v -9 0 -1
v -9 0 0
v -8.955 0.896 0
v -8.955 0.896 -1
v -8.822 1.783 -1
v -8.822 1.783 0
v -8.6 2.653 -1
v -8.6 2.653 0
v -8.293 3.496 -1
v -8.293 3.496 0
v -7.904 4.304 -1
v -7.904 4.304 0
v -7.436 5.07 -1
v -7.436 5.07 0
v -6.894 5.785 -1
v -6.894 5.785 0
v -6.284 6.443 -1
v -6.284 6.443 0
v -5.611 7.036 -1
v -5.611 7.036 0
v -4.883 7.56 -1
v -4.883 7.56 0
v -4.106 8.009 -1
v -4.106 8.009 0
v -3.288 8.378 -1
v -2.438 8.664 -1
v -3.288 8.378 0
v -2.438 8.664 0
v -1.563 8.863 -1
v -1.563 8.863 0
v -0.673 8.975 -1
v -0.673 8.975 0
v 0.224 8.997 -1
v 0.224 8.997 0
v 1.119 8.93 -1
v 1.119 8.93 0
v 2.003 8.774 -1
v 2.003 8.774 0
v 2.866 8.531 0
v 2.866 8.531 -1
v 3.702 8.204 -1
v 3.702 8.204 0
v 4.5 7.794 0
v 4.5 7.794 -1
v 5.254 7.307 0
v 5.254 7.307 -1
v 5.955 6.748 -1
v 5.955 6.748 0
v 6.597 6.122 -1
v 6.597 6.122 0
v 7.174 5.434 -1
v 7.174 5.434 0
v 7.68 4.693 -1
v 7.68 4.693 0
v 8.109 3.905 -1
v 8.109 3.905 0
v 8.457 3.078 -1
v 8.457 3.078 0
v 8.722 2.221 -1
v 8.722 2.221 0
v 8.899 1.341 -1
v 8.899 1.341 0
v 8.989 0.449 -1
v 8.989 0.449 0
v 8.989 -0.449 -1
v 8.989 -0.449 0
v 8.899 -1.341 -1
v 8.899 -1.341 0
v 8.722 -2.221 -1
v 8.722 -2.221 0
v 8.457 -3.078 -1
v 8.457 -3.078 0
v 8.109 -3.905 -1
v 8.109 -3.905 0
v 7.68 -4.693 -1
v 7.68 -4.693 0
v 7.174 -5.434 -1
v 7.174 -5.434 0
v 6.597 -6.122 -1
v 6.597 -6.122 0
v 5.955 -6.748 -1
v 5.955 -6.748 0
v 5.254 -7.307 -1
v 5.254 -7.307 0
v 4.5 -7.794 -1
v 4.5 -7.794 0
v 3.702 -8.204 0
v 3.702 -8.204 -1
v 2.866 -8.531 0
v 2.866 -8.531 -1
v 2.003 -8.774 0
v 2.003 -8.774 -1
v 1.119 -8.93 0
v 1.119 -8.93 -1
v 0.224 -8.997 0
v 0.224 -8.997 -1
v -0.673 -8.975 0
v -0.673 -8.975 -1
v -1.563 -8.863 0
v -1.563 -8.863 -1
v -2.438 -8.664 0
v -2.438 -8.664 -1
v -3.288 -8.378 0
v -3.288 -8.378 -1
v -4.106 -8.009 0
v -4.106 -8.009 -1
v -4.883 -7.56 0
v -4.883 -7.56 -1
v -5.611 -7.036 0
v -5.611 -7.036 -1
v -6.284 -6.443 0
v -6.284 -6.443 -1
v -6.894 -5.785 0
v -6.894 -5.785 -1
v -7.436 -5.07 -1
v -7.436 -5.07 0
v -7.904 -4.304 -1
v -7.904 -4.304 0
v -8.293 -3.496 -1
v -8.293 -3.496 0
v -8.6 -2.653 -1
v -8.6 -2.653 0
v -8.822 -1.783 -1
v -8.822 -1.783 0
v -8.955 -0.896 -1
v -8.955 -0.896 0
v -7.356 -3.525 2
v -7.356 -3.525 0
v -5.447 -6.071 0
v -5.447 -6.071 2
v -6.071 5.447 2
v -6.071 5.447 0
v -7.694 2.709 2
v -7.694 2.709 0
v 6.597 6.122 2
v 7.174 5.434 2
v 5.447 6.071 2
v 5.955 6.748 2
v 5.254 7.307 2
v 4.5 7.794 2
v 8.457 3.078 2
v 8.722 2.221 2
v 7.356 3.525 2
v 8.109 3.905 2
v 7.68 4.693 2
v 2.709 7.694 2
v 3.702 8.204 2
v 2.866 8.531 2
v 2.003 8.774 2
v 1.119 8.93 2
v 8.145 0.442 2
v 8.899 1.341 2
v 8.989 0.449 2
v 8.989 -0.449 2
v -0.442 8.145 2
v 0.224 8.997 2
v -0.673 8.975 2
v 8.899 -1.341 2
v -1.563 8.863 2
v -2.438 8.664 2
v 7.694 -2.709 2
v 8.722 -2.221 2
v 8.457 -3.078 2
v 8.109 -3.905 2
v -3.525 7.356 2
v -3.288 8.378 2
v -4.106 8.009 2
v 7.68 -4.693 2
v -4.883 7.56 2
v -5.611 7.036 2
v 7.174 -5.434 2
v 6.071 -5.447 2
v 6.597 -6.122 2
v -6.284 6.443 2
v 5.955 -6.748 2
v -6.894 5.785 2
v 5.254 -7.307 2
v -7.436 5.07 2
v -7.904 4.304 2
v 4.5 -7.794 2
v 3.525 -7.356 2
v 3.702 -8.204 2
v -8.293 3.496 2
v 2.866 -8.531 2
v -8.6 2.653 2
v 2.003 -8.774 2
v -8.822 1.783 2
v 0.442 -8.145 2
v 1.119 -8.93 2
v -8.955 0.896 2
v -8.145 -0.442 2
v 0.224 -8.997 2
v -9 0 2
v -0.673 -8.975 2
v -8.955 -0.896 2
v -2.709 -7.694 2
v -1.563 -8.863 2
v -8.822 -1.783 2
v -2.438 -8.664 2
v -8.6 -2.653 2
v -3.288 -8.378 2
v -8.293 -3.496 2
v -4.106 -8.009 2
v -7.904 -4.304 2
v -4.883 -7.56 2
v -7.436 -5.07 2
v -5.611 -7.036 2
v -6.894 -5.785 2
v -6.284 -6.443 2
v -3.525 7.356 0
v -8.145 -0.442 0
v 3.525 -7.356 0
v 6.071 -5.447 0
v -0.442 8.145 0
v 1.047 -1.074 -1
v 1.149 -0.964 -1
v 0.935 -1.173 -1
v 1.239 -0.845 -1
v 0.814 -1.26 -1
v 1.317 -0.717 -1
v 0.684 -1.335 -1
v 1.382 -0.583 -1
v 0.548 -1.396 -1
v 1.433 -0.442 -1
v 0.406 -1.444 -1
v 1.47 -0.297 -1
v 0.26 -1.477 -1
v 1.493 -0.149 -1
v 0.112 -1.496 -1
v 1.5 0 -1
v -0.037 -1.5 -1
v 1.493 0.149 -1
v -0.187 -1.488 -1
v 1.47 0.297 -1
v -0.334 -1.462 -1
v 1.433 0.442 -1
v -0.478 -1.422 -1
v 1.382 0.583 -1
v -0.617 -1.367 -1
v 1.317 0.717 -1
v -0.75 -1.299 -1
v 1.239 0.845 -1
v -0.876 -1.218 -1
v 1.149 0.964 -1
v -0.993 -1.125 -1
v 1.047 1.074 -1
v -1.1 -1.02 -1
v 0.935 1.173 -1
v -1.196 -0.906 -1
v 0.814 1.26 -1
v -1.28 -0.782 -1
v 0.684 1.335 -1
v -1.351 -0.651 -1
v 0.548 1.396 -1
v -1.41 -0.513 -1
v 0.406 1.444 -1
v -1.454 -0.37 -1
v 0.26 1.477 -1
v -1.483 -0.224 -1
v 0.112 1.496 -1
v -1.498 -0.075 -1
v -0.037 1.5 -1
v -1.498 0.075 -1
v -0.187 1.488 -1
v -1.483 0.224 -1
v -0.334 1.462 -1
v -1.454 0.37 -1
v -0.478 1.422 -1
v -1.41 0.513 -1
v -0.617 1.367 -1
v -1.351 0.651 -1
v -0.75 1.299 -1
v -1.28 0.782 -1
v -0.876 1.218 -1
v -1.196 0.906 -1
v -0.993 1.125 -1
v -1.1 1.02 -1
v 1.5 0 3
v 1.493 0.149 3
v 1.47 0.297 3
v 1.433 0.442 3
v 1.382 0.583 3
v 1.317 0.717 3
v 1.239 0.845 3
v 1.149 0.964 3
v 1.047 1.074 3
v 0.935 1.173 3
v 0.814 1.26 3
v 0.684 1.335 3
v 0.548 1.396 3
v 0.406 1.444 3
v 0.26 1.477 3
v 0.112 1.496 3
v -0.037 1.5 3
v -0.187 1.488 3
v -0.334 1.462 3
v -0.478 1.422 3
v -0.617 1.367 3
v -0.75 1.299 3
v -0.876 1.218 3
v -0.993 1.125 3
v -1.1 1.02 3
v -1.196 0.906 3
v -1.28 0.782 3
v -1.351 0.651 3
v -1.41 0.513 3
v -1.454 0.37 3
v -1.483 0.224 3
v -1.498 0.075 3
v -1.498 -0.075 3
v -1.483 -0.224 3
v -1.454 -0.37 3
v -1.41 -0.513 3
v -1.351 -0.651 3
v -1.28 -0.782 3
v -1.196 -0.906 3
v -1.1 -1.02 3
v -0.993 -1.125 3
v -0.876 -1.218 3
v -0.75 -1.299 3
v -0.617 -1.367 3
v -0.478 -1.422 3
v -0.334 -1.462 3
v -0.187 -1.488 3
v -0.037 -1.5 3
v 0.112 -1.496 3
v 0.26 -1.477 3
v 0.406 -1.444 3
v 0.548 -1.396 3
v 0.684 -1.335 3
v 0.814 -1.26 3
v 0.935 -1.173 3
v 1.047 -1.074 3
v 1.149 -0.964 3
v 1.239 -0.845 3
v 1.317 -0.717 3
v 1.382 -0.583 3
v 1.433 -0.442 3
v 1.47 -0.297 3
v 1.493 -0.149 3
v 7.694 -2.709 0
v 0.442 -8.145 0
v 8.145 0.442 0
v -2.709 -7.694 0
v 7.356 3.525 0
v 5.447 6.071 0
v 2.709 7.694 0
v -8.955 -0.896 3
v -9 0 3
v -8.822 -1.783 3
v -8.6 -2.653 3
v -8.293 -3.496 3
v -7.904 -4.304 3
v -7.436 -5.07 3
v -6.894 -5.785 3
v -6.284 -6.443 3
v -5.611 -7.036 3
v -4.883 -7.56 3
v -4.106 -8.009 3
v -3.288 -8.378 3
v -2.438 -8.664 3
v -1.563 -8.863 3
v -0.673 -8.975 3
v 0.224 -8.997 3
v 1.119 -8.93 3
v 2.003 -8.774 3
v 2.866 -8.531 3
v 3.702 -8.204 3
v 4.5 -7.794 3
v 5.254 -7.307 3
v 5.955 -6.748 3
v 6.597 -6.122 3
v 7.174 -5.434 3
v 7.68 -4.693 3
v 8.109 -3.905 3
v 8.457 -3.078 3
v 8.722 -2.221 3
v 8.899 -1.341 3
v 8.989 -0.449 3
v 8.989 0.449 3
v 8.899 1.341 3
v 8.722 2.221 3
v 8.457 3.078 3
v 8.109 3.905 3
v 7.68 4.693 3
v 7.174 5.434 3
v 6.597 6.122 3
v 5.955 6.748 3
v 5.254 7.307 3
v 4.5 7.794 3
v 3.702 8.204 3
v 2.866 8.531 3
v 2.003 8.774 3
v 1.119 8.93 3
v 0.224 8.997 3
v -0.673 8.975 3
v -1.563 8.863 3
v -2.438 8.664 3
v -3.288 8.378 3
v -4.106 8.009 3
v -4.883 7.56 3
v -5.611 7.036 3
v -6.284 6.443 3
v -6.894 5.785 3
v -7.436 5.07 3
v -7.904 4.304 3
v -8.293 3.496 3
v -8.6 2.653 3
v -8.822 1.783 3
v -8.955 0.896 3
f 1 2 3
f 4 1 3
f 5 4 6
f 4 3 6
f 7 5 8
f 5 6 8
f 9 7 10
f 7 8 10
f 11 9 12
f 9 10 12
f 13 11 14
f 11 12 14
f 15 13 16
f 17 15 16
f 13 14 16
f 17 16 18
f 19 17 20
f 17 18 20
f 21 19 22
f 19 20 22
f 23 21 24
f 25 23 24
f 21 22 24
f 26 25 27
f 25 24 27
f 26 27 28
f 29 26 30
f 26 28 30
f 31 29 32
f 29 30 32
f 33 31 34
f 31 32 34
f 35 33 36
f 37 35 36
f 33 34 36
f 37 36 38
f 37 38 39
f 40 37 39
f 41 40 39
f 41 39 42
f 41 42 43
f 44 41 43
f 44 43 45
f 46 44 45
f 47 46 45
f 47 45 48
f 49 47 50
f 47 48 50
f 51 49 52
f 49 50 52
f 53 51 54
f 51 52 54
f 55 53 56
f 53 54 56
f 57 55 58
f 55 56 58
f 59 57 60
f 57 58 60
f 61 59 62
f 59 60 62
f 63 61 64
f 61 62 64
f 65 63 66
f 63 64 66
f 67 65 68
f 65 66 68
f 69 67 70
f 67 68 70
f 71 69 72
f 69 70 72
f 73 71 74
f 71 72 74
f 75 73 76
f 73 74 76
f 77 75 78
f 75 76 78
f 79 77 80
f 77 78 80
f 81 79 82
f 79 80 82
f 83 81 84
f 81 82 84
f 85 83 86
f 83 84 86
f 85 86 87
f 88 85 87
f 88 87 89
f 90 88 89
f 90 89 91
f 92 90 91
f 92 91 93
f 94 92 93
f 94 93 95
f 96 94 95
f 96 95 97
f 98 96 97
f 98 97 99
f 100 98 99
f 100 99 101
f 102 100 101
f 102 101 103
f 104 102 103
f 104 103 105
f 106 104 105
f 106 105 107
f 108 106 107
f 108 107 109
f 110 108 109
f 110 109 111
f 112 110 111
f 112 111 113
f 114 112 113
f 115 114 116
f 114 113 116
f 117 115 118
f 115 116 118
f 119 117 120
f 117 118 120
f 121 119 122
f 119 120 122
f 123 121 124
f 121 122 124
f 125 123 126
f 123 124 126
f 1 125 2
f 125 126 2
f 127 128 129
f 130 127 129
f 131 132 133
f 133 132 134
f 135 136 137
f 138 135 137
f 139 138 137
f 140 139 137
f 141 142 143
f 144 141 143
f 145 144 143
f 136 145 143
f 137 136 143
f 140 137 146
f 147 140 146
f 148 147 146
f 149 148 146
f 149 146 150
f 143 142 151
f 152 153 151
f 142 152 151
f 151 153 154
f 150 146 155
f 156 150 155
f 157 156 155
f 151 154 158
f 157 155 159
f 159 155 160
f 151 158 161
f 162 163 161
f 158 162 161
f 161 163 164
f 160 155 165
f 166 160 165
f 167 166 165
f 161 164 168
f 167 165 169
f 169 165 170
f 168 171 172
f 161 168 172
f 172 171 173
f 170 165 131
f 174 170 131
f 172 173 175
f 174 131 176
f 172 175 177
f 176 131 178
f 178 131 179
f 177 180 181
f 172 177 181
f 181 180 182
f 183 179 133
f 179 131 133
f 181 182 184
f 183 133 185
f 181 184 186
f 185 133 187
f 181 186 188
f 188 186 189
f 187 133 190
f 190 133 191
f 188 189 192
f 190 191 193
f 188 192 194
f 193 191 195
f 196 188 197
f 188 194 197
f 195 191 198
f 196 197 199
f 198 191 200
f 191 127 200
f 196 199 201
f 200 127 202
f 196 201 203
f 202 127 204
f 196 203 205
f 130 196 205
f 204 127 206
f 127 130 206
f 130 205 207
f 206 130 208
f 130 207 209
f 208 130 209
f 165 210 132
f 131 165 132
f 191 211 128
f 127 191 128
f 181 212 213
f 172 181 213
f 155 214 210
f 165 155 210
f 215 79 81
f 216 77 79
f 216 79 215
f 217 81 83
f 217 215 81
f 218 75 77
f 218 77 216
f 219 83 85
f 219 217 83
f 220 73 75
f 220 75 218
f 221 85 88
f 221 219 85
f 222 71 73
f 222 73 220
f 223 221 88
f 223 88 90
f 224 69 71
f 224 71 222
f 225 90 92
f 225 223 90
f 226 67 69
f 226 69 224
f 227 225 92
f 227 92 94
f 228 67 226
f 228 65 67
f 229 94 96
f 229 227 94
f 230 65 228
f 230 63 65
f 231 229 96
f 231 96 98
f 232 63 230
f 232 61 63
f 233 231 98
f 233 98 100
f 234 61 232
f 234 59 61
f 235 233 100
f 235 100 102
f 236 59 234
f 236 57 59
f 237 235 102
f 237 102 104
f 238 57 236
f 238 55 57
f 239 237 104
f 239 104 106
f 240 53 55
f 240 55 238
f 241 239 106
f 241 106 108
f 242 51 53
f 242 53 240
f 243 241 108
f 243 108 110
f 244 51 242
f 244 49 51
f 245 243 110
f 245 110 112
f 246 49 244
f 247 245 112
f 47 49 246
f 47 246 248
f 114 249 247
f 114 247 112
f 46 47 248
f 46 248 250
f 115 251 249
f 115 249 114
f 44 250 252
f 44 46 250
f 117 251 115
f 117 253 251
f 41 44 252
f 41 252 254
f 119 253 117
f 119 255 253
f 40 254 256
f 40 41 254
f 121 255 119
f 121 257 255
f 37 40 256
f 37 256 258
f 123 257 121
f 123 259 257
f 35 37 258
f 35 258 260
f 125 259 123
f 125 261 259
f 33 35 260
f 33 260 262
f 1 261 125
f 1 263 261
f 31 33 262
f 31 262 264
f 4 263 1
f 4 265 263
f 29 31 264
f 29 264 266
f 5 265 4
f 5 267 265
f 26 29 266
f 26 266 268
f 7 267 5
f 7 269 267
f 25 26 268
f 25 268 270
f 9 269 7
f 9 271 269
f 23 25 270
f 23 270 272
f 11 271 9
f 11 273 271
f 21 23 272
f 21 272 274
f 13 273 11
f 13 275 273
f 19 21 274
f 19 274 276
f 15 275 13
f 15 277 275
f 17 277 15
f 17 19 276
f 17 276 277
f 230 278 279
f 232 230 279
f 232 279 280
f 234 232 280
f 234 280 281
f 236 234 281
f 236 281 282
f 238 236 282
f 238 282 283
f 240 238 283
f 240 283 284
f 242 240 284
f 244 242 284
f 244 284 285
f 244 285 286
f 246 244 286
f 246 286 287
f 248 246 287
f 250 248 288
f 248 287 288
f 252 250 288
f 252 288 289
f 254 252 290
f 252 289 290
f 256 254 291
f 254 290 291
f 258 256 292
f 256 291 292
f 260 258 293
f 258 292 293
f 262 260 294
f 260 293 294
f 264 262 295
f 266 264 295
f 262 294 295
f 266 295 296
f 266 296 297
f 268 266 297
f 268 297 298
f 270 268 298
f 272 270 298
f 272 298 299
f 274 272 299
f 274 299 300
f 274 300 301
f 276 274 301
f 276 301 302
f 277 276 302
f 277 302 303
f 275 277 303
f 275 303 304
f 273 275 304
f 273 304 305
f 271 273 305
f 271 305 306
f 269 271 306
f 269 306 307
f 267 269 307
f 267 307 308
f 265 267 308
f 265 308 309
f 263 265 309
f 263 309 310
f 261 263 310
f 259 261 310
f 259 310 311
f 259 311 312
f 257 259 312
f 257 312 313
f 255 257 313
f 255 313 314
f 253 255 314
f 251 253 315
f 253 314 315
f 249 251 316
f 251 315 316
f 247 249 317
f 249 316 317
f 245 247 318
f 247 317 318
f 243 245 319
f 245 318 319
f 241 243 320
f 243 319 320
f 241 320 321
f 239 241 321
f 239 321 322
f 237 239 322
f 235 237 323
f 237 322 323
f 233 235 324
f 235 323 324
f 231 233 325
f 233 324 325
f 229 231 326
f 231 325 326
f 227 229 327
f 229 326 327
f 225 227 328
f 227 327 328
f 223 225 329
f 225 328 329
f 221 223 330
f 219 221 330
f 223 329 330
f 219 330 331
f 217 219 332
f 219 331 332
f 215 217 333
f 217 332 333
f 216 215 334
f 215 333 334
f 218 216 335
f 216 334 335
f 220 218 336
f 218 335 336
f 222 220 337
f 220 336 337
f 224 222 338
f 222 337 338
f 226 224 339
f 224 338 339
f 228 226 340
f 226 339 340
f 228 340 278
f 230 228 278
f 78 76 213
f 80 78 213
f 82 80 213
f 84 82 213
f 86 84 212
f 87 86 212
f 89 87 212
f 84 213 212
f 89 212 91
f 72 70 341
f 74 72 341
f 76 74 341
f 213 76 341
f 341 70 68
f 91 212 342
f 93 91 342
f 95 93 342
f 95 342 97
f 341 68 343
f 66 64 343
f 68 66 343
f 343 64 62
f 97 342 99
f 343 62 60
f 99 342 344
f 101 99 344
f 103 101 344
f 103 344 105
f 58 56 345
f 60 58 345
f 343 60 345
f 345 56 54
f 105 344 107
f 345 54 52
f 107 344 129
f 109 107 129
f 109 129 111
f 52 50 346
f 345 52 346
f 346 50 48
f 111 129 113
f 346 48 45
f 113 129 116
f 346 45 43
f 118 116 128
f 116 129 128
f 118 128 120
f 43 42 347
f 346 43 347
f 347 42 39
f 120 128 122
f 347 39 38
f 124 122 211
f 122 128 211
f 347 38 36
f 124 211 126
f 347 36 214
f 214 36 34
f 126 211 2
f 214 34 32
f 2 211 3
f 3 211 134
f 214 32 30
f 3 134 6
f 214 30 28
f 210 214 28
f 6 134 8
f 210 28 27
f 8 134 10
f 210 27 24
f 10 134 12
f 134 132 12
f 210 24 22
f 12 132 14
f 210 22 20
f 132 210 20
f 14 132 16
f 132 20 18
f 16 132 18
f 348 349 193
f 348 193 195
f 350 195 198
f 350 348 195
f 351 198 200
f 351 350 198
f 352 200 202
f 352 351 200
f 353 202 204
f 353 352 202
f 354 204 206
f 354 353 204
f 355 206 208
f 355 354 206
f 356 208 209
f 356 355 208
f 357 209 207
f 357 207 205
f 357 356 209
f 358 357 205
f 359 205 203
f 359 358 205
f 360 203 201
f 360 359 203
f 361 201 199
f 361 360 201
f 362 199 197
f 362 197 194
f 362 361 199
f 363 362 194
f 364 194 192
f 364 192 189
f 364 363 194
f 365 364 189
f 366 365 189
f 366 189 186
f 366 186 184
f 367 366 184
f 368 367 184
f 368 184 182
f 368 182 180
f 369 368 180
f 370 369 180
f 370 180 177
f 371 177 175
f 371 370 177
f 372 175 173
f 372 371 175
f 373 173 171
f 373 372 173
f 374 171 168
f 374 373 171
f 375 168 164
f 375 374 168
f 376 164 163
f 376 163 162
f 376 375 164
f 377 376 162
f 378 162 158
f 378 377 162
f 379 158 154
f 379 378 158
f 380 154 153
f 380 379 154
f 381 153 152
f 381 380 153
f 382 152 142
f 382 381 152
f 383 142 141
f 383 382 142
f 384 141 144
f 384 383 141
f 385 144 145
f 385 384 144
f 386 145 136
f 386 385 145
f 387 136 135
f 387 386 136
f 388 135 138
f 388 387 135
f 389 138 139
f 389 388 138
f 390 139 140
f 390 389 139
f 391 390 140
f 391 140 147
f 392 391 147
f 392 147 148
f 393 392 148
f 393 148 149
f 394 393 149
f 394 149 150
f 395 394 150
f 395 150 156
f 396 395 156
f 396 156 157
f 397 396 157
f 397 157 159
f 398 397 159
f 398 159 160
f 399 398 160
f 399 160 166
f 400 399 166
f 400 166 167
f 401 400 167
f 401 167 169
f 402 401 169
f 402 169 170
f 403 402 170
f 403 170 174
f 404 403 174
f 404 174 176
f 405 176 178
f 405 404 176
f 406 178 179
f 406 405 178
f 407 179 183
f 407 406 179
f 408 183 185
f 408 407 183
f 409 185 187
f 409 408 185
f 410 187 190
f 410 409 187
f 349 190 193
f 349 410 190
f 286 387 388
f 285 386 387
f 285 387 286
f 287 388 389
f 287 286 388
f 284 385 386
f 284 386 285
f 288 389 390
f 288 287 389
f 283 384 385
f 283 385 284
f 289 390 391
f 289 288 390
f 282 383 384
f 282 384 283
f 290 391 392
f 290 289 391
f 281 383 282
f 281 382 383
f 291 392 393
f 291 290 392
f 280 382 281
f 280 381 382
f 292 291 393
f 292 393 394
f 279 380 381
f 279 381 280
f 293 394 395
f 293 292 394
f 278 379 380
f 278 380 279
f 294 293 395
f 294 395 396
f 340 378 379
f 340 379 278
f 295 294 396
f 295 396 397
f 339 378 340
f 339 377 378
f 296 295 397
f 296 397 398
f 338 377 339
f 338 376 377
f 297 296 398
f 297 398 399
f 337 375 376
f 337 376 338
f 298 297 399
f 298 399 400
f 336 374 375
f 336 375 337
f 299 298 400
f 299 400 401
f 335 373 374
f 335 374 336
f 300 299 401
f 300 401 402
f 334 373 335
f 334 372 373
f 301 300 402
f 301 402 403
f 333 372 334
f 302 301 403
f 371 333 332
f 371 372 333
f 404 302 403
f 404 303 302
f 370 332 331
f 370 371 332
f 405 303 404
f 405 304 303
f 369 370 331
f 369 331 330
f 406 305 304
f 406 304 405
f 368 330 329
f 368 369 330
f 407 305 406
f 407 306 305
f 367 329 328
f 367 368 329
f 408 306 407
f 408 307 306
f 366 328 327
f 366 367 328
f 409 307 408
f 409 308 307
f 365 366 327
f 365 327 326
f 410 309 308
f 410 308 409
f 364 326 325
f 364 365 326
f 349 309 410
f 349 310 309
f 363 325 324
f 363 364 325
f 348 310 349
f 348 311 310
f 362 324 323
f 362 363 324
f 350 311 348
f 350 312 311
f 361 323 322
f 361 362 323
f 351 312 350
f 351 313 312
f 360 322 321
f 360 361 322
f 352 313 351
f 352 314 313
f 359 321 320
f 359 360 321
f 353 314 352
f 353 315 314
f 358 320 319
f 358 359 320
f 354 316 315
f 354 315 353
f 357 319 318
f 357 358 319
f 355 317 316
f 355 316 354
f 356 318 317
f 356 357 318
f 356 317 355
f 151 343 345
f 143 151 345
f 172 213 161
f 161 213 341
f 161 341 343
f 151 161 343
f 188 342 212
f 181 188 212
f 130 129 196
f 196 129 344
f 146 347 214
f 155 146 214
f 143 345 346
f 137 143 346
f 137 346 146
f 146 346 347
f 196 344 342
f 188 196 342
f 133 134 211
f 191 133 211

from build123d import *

# Parameters (mm, degrees)
EXTRUDE_1_DEPTH     = 2
SKETCH_2_R          = 9
EXTRUDE_2_DEPTH     = 1
EXTRUDE_START       = 1
SKETCH_3_R          = 9
EXTRUDE_3_DEPTH     = 1
SKETCH_4_R          = 1.5
CUT_EXTRUDE_1_DEPTH = 14.341664064


with BuildPart() as part:
    # Эскиз1 → Бобышка-Вытянуть1 (new body)
    with BuildSketch(Plane.XY):
        Polygon((8.144765867, 0.441612145), (7.35578483, 3.52486338), (5.446952233, 6.071486118), (2.708870535, 7.693780133), (-0.441612145, 8.144765867), (-3.52486338, 7.35578483), (-6.071486118, 5.446952233), (-7.693780133, 2.708870535), (-8.144765867, -0.441612145), (-7.35578483, -3.52486338), (-5.446952233, -6.071486118), (-2.708870535, -7.693780133), (0.441612145, -8.144765867), (3.52486338, -7.35578483), (6.071486118, -5.446952233), (7.693780133, -2.708870535), align=None)
    extrude(amount=EXTRUDE_1_DEPTH)

    # Эскиз2 → Бобышка-Вытянуть2 (add)
    with BuildSketch(Plane(origin=(0, 0, 0), x_dir=(-1, 0, 0), z_dir=(0, 0, -1))):
        Circle(SKETCH_2_R)
    extrude(amount=EXTRUDE_2_DEPTH)

    # Эскиз3 → Бобышка-Вытянуть3 (add)
    with BuildSketch(Plane.XY.offset(2).offset(EXTRUDE_START)):
        with Locations(Location((0, 0, 0), (0, 0, 180))):
            Circle(SKETCH_3_R)
    extrude(amount=-EXTRUDE_3_DEPTH)

    # Эскиз4 → Вырез-Вытянуть1 (cut, through all)
    with BuildSketch(Plane.XY.offset(3)):
        Circle(SKETCH_4_R)
    extrude(amount=-CUT_EXTRUDE_1_DEPTH, mode=Mode.SUBTRACT)


solid = part.part
